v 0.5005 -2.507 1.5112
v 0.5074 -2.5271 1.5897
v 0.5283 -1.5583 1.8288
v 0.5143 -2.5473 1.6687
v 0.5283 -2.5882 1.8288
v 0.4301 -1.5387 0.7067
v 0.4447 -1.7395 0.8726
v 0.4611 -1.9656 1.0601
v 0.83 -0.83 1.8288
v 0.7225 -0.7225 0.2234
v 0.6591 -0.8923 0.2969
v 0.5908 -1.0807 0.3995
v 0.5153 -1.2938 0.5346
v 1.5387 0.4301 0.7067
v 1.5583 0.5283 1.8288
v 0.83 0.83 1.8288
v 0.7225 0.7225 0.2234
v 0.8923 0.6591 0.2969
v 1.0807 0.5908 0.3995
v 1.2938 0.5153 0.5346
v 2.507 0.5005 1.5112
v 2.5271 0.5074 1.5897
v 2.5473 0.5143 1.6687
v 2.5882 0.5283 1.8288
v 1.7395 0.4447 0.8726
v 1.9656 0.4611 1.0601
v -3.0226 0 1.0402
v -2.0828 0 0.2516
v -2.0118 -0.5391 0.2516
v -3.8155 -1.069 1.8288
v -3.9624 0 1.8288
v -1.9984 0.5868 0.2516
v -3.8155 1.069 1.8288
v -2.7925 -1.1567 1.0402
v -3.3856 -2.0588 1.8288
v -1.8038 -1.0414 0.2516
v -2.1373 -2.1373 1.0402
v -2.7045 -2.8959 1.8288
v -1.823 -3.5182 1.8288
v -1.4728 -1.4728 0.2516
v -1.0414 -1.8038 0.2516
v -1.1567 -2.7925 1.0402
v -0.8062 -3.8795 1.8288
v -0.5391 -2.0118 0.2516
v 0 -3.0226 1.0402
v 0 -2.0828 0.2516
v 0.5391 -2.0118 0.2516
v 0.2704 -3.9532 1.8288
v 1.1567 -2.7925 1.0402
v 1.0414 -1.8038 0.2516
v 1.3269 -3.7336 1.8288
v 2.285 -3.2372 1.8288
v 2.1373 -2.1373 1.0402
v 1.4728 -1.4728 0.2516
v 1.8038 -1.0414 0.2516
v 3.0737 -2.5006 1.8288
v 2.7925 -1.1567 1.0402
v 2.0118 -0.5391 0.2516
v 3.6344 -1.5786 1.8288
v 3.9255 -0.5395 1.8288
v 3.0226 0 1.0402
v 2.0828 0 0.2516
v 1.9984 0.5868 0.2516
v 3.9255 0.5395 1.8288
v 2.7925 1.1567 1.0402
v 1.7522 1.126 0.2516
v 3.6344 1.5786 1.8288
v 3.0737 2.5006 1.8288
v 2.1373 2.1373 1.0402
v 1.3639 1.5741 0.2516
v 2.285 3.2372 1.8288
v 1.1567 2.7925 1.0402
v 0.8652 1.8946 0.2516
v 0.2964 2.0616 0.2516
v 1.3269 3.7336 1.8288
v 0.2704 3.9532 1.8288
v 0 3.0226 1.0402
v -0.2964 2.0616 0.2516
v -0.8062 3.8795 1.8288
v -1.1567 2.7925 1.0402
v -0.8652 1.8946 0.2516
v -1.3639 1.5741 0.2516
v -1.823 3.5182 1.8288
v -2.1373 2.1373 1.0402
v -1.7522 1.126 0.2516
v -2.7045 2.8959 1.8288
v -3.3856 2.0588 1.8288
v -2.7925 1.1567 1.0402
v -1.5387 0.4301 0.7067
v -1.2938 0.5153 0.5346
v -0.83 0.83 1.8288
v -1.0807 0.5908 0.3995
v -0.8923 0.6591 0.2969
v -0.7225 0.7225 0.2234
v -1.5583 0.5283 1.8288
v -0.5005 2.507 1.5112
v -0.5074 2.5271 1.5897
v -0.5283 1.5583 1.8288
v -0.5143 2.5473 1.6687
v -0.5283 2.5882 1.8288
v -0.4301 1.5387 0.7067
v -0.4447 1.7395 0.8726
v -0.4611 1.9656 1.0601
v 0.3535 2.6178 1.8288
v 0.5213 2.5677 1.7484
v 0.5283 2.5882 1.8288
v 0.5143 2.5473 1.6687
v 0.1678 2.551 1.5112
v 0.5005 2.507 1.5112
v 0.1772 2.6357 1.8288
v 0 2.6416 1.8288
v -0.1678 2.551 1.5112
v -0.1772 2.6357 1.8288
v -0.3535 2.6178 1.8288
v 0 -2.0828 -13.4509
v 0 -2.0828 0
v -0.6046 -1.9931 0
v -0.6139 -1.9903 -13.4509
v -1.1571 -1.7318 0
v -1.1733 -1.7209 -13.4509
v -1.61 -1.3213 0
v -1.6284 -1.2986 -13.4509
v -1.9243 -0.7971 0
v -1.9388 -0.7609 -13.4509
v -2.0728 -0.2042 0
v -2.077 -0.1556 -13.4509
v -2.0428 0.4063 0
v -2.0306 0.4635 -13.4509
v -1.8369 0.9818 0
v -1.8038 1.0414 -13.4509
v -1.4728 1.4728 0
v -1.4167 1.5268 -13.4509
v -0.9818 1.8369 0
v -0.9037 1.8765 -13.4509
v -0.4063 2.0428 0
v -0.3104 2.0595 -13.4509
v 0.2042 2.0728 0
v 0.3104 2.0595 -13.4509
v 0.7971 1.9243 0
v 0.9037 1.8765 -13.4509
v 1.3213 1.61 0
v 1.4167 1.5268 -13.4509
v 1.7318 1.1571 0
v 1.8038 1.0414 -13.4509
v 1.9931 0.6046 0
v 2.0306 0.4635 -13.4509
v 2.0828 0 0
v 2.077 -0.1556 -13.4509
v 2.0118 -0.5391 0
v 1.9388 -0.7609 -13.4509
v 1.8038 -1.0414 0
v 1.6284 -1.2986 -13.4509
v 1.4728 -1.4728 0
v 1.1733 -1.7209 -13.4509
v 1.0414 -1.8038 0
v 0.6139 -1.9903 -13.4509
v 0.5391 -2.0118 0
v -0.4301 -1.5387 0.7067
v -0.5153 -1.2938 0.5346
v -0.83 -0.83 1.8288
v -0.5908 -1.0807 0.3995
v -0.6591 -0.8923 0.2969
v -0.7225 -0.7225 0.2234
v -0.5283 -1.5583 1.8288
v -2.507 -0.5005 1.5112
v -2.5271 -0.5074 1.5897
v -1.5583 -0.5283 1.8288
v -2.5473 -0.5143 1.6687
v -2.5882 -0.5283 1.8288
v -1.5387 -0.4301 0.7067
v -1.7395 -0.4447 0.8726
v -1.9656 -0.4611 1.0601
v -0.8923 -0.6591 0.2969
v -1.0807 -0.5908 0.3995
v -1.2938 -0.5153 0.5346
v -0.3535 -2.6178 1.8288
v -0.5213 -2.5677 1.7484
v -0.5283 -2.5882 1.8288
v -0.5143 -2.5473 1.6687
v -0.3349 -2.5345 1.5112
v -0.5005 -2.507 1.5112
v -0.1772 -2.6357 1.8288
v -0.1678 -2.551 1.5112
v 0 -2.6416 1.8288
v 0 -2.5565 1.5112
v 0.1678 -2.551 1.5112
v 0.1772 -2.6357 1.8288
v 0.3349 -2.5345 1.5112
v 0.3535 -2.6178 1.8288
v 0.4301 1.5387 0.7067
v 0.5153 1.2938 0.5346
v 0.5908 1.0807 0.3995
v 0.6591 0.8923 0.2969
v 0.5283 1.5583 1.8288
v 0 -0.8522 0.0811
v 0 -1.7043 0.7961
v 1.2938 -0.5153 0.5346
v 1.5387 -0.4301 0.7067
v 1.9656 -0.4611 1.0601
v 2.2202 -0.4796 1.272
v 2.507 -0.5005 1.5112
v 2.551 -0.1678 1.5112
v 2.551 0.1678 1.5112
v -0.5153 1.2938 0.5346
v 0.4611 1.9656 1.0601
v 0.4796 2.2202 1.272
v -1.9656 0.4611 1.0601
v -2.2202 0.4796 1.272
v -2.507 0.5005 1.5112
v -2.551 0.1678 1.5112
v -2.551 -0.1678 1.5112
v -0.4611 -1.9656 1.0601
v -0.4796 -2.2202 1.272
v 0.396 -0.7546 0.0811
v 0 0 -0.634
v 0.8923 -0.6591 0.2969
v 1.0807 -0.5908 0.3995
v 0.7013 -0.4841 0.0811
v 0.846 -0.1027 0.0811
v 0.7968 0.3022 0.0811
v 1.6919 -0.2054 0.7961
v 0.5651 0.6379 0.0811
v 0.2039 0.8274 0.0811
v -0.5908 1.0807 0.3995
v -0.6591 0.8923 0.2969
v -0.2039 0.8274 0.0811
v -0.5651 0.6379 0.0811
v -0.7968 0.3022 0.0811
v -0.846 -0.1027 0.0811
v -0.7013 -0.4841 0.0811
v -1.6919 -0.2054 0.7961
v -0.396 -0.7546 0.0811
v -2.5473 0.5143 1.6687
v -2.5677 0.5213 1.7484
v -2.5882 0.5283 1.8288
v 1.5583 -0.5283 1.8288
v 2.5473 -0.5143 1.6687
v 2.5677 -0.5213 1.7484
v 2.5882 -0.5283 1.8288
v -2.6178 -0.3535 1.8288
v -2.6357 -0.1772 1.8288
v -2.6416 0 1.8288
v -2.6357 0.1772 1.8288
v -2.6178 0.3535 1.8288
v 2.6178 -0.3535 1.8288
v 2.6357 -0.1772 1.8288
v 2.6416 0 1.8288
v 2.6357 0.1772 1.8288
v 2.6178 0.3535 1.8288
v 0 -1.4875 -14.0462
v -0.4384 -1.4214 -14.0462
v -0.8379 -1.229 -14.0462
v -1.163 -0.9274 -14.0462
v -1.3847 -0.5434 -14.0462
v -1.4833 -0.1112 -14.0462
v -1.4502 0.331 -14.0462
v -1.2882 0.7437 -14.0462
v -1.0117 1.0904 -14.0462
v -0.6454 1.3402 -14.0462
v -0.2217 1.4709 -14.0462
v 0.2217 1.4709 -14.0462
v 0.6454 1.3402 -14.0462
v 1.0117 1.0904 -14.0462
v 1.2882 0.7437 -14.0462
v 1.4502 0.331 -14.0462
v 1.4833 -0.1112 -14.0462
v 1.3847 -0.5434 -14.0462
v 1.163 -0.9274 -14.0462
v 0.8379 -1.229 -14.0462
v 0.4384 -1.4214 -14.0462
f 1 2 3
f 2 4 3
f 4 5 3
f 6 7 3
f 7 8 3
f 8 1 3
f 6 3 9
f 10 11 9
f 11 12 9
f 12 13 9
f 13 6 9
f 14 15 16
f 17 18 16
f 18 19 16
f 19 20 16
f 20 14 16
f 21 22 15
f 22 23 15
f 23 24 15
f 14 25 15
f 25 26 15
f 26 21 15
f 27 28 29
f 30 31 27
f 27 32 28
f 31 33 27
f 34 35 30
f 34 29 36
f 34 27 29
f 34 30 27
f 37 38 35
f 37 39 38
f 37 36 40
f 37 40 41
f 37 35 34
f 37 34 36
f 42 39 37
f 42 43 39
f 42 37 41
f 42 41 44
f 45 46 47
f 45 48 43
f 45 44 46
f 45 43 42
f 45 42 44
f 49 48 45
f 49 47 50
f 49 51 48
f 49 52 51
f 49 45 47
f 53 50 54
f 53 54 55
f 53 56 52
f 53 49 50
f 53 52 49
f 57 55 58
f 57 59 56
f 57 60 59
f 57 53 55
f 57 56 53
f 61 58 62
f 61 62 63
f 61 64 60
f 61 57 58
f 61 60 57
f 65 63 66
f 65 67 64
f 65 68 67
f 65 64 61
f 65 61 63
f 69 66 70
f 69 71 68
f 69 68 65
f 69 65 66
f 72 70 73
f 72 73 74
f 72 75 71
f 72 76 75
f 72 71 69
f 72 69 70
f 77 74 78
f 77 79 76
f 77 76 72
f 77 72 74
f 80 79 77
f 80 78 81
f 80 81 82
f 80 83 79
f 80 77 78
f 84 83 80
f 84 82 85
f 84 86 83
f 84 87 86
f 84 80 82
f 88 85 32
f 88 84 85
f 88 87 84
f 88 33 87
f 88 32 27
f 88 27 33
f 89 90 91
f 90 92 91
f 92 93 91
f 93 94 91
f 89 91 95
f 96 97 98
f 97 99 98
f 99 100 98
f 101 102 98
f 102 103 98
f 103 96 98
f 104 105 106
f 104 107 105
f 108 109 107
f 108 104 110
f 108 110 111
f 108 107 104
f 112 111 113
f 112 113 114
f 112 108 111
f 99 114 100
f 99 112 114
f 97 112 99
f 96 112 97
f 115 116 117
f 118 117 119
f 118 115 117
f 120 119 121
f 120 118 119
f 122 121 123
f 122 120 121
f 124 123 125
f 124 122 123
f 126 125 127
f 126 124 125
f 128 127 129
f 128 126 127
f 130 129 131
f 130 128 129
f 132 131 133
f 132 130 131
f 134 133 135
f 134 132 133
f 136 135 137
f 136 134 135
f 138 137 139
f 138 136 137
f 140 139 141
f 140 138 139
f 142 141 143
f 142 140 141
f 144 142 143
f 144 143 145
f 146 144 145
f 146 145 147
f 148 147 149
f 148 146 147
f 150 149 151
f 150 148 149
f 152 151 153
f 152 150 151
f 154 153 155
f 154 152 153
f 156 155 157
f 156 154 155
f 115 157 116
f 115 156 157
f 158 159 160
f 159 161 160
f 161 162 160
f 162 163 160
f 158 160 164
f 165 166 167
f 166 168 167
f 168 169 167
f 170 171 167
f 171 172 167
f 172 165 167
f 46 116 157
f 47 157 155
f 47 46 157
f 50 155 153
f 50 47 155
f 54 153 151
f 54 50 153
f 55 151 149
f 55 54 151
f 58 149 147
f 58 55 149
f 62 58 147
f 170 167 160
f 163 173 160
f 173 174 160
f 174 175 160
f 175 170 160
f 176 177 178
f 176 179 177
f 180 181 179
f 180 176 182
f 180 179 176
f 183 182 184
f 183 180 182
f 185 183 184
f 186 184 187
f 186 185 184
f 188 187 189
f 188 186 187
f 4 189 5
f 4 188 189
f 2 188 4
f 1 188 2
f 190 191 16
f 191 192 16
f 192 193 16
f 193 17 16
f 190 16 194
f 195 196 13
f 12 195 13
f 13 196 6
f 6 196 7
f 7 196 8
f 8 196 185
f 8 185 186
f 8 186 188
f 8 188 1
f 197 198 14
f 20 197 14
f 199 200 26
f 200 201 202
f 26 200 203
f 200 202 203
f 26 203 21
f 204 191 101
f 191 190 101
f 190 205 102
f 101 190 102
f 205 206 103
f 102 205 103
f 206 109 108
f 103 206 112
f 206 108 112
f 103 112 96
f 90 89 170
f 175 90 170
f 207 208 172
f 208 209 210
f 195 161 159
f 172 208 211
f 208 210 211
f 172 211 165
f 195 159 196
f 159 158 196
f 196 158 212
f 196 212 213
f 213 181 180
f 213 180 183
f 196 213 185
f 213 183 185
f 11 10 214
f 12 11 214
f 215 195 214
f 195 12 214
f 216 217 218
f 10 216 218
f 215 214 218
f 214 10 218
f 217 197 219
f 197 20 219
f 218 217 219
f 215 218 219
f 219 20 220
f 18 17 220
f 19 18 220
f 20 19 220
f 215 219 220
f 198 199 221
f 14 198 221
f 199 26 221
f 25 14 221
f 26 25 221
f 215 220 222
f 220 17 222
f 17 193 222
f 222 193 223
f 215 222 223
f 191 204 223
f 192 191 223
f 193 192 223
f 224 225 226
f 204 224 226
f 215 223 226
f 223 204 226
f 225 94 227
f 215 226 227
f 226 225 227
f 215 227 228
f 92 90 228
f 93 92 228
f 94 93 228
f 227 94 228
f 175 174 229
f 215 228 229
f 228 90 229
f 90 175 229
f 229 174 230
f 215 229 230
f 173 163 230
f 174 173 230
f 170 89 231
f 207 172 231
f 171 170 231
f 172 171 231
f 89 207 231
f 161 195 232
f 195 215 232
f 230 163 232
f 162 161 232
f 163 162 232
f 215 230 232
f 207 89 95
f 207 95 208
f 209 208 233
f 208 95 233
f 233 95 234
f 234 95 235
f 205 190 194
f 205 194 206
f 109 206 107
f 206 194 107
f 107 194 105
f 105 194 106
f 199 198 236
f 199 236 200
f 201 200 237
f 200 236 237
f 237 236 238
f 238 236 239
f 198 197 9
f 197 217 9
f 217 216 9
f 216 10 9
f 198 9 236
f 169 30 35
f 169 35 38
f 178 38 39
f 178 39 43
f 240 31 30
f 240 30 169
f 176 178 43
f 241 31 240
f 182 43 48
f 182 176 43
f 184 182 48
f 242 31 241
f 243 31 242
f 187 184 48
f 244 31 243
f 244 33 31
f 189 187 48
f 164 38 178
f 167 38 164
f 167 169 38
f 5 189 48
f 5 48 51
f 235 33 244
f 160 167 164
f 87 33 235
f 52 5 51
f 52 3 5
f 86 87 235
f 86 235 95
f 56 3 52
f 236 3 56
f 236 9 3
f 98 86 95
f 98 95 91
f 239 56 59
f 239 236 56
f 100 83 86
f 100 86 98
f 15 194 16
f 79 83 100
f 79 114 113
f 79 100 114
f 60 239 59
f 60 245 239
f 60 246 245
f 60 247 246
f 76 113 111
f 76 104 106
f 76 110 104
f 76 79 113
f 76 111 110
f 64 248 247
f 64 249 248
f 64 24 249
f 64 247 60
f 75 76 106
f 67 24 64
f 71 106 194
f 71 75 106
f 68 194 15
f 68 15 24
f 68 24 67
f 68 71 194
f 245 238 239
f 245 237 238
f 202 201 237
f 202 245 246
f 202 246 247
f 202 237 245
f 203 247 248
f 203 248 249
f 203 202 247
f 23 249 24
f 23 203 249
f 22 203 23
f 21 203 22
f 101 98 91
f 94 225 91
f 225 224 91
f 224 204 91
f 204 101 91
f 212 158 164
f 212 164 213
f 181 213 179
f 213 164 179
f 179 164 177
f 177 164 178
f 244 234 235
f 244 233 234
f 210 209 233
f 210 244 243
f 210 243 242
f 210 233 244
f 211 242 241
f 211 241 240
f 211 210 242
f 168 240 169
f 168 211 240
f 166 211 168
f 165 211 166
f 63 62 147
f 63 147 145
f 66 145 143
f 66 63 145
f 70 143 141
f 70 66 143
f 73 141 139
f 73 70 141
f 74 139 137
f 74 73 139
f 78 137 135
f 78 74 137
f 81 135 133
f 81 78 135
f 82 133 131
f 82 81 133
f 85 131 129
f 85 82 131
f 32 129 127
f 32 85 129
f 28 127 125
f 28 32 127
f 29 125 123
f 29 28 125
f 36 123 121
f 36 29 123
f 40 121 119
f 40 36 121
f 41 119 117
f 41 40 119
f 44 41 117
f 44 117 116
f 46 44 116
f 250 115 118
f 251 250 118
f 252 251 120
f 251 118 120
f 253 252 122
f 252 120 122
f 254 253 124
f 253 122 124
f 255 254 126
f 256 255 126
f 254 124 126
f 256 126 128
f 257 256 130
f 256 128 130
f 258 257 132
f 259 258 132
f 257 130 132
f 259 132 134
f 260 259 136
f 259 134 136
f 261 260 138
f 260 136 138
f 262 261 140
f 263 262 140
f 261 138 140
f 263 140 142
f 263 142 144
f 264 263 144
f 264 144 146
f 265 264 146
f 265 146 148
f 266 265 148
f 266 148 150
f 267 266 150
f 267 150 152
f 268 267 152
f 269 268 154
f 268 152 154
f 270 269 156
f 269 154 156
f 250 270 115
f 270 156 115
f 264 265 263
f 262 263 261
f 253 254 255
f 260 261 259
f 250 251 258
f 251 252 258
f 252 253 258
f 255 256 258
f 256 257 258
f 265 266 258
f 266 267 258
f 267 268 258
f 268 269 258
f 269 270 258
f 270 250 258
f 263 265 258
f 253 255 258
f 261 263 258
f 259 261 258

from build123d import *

# Parameters (mm, degrees)
SKETCH1_R          = 3.9624
EXTRUDE3_DEPTH     = 1.8288
SKETCH4_W          = 15.875
SKETCH4_H          = 2.0828
CHAMFER1_SIZE      = 0.5953125
SKETCH26_R         = 1.0414
EXTRUDE8_DEPTH     = 1.8288
CUT_EXTRUDE3_REACH = 18.835
CIRPATTERN1_COUNT  = 4
DRAFT2_ANGLE       = 5


# Read off the part's stored shape, not the designer's step: Extrude10, Draft1
with BuildPart() as part:
    # Sketch1 → Extrude3 (new body)
    with BuildSketch(Plane.XY):
        Circle(SKETCH1_R)
    extrude(amount=EXTRUDE3_DEPTH)

    # Sketch11 → Cut-Revolve3 (revolve, cut)
    with BuildSketch(Plane(origin=(0, 0, 0), x_dir=(0, 0, -1), z_dir=(1, 0, 0)), mode=Mode.PRIVATE) as cut_revolve3_sk:
        Polygon((0, 1.78292103), (-1.8288, 3.9624), (0, 3.9624), align=None)
    revolve(cut_revolve3_sk.sketch.rotate(Axis((0, 0, -0.441444004), (0, 0, 1)), 90), axis=Axis((0, 0, -0.441444004), (0, 0, 1)), mode=Mode.SUBTRACT)

    # Extrude10 outline → Extrude10 (revolve)
    with BuildSketch(Plane.XZ):
        Polygon((2.0828, 0), (2.0828, 0.251628333), (1.78292103, 0.251628333), (1.78292103, 0), (0, 0), (0, -2.0828), align=None)
    revolve(axis=Axis((0, 0, 0), (0, 0, 1)))



with BuildPart() as body_2:
    # Sketch4 → Revolve1 (revolve)
    with BuildSketch(Plane(origin=(0, 0, 0), x_dir=(0, 0, -1), z_dir=(1, 0, 0)), mode=Mode.PRIVATE) as revolve1_sk:
        with Locations((6.1087, 1.0414)):
            Rectangle(SKETCH4_W, SKETCH4_H)
    revolve(revolve1_sk.sketch.rotate(Axis((0, 0, 1.8288), (0, 0, -1)), 180), axis=Axis((0, 0, 1.8288), (0, 0, -1)))

    # Chamfer1
    chamfer1_edges = [body_2.edges().sort_by_distance(p)[0] for p in [
        (0, 2.0828, -14.0462),
    ]]
    chamfer(chamfer1_edges, length=CHAMFER1_SIZE)


with BuildPart() as part_1:
    add(part.part)

    add(body_2.part)  # Extrude8 merges body 2
    # Sketch26 → Extrude8 (add)
    with BuildSketch(Plane.XY.offset(1.8288)):
        Circle(SKETCH26_R)
    extrude(amount=-EXTRUDE8_DEPTH)

    # Cut-Extrude3: up to this cone (the profile starts inside it)
    cut_extrude3_end = Plane(origin=(0, 0, 1.8288), z_dir=(0, 0, 1)).offset(-2.462756405) * Cone(1.192e-06, 29.475352474, 24.732756389, align=(Align.CENTER, Align.CENTER, Align.MIN), mode=Mode.PRIVATE)
    # Sketch12 → Cut-Extrude3 (cut, up to the surface)
    with BuildSketch(Plane.XY.offset(1.8288), mode=Mode.PRIVATE) as cut_extrude3_sk1:
        with BuildLine():
            Line((2.588228842, 0.52832), (1.558274421, 0.52832))
            Line((1.558274421, 0.52832), (0.829986666, 0.829986666))
            Line((0.829986666, 0.829986666), (0.52832, 1.558274421))
            Line((0.52832, 1.558274421), (0.52832, 2.588228842))
            ThreePointArc((0.52832, 2.588228842), (0.265504474, 2.628223342), (0, 2.6416))
            Line((0, 2.6416), (0, 0))
            Line((0, 0), (2.6416, 0))
            ThreePointArc((2.6416, 0), (2.628223342, 0.265504474), (2.588228842, 0.52832))
        make_face()
    cut_extrude3_tool1 = extrude(cut_extrude3_sk1.sketch, amount=-CUT_EXTRUDE3_REACH, mode=Mode.PRIVATE) & cut_extrude3_end
    cut_extrude3 = cut_extrude3_tool1.solids().sort_by_distance((2.591055, 0.26175, 1.8288))[0]
    add(cut_extrude3, mode=Mode.SUBTRACT)

    # CirPattern1: Cut-Extrude3 ×4 about axis
    cirpattern1_axis = Axis((0, 0, 0), (0, 0, 1))
    for i in range(1, CIRPATTERN1_COUNT):
        add(cut_extrude3.rotate(cirpattern1_axis, i * 360 / CIRPATTERN1_COUNT), mode=Mode.SUBTRACT)

    # Draft1 outline → Draft1 (revolve)
    with BuildSketch(Plane.XZ):
        Polygon((2.6416, 1.8288), (2.556499421, 1.511200317), (2.6416, 1.511200317), align=None)
    revolve(axis=Axis((0, 0, 0), (0, 0, 1)))

    # Draft2
    draft2_faces = [part_1.faces().sort_by_distance(p)[0] for p in [
        (0.52832, 1.956108767, 1.448849015),
        (0.686884975, 1.175464708, 1.173602986),
        (1.175464708, 0.686884975, 1.173602986),
        (1.956108767, 0.52832, 1.448849015),
        (1.956108767, -0.52832, 1.448849015),
        (1.175464708, -0.686884975, 1.173602986),
        (0.686884975, -1.175464708, 1.173602986),
        (0.52832, -1.956108767, 1.448849015),
        (-0.52832, -1.956108767, 1.448849015),
        (-0.686884975, -1.175464708, 1.173602986),
        (-1.175464708, -0.686884975, 1.173602986),
        (-1.956108767, -0.52832, 1.448849015),
        (-1.956108767, 0.52832, 1.448849015),
        (-1.175464708, 0.686884975, 1.173602986),
        (-0.686884975, 1.175464708, 1.173602986),
        (-0.52832, 1.956108767, 1.448849015),
    ]]
    draft(draft2_faces, Plane(origin=(0, 2.0828, 1.8288), x_dir=(0, 1, 0), z_dir=(0, 0, 1)), DRAFT2_ANGLE)


solid = part_1.part
